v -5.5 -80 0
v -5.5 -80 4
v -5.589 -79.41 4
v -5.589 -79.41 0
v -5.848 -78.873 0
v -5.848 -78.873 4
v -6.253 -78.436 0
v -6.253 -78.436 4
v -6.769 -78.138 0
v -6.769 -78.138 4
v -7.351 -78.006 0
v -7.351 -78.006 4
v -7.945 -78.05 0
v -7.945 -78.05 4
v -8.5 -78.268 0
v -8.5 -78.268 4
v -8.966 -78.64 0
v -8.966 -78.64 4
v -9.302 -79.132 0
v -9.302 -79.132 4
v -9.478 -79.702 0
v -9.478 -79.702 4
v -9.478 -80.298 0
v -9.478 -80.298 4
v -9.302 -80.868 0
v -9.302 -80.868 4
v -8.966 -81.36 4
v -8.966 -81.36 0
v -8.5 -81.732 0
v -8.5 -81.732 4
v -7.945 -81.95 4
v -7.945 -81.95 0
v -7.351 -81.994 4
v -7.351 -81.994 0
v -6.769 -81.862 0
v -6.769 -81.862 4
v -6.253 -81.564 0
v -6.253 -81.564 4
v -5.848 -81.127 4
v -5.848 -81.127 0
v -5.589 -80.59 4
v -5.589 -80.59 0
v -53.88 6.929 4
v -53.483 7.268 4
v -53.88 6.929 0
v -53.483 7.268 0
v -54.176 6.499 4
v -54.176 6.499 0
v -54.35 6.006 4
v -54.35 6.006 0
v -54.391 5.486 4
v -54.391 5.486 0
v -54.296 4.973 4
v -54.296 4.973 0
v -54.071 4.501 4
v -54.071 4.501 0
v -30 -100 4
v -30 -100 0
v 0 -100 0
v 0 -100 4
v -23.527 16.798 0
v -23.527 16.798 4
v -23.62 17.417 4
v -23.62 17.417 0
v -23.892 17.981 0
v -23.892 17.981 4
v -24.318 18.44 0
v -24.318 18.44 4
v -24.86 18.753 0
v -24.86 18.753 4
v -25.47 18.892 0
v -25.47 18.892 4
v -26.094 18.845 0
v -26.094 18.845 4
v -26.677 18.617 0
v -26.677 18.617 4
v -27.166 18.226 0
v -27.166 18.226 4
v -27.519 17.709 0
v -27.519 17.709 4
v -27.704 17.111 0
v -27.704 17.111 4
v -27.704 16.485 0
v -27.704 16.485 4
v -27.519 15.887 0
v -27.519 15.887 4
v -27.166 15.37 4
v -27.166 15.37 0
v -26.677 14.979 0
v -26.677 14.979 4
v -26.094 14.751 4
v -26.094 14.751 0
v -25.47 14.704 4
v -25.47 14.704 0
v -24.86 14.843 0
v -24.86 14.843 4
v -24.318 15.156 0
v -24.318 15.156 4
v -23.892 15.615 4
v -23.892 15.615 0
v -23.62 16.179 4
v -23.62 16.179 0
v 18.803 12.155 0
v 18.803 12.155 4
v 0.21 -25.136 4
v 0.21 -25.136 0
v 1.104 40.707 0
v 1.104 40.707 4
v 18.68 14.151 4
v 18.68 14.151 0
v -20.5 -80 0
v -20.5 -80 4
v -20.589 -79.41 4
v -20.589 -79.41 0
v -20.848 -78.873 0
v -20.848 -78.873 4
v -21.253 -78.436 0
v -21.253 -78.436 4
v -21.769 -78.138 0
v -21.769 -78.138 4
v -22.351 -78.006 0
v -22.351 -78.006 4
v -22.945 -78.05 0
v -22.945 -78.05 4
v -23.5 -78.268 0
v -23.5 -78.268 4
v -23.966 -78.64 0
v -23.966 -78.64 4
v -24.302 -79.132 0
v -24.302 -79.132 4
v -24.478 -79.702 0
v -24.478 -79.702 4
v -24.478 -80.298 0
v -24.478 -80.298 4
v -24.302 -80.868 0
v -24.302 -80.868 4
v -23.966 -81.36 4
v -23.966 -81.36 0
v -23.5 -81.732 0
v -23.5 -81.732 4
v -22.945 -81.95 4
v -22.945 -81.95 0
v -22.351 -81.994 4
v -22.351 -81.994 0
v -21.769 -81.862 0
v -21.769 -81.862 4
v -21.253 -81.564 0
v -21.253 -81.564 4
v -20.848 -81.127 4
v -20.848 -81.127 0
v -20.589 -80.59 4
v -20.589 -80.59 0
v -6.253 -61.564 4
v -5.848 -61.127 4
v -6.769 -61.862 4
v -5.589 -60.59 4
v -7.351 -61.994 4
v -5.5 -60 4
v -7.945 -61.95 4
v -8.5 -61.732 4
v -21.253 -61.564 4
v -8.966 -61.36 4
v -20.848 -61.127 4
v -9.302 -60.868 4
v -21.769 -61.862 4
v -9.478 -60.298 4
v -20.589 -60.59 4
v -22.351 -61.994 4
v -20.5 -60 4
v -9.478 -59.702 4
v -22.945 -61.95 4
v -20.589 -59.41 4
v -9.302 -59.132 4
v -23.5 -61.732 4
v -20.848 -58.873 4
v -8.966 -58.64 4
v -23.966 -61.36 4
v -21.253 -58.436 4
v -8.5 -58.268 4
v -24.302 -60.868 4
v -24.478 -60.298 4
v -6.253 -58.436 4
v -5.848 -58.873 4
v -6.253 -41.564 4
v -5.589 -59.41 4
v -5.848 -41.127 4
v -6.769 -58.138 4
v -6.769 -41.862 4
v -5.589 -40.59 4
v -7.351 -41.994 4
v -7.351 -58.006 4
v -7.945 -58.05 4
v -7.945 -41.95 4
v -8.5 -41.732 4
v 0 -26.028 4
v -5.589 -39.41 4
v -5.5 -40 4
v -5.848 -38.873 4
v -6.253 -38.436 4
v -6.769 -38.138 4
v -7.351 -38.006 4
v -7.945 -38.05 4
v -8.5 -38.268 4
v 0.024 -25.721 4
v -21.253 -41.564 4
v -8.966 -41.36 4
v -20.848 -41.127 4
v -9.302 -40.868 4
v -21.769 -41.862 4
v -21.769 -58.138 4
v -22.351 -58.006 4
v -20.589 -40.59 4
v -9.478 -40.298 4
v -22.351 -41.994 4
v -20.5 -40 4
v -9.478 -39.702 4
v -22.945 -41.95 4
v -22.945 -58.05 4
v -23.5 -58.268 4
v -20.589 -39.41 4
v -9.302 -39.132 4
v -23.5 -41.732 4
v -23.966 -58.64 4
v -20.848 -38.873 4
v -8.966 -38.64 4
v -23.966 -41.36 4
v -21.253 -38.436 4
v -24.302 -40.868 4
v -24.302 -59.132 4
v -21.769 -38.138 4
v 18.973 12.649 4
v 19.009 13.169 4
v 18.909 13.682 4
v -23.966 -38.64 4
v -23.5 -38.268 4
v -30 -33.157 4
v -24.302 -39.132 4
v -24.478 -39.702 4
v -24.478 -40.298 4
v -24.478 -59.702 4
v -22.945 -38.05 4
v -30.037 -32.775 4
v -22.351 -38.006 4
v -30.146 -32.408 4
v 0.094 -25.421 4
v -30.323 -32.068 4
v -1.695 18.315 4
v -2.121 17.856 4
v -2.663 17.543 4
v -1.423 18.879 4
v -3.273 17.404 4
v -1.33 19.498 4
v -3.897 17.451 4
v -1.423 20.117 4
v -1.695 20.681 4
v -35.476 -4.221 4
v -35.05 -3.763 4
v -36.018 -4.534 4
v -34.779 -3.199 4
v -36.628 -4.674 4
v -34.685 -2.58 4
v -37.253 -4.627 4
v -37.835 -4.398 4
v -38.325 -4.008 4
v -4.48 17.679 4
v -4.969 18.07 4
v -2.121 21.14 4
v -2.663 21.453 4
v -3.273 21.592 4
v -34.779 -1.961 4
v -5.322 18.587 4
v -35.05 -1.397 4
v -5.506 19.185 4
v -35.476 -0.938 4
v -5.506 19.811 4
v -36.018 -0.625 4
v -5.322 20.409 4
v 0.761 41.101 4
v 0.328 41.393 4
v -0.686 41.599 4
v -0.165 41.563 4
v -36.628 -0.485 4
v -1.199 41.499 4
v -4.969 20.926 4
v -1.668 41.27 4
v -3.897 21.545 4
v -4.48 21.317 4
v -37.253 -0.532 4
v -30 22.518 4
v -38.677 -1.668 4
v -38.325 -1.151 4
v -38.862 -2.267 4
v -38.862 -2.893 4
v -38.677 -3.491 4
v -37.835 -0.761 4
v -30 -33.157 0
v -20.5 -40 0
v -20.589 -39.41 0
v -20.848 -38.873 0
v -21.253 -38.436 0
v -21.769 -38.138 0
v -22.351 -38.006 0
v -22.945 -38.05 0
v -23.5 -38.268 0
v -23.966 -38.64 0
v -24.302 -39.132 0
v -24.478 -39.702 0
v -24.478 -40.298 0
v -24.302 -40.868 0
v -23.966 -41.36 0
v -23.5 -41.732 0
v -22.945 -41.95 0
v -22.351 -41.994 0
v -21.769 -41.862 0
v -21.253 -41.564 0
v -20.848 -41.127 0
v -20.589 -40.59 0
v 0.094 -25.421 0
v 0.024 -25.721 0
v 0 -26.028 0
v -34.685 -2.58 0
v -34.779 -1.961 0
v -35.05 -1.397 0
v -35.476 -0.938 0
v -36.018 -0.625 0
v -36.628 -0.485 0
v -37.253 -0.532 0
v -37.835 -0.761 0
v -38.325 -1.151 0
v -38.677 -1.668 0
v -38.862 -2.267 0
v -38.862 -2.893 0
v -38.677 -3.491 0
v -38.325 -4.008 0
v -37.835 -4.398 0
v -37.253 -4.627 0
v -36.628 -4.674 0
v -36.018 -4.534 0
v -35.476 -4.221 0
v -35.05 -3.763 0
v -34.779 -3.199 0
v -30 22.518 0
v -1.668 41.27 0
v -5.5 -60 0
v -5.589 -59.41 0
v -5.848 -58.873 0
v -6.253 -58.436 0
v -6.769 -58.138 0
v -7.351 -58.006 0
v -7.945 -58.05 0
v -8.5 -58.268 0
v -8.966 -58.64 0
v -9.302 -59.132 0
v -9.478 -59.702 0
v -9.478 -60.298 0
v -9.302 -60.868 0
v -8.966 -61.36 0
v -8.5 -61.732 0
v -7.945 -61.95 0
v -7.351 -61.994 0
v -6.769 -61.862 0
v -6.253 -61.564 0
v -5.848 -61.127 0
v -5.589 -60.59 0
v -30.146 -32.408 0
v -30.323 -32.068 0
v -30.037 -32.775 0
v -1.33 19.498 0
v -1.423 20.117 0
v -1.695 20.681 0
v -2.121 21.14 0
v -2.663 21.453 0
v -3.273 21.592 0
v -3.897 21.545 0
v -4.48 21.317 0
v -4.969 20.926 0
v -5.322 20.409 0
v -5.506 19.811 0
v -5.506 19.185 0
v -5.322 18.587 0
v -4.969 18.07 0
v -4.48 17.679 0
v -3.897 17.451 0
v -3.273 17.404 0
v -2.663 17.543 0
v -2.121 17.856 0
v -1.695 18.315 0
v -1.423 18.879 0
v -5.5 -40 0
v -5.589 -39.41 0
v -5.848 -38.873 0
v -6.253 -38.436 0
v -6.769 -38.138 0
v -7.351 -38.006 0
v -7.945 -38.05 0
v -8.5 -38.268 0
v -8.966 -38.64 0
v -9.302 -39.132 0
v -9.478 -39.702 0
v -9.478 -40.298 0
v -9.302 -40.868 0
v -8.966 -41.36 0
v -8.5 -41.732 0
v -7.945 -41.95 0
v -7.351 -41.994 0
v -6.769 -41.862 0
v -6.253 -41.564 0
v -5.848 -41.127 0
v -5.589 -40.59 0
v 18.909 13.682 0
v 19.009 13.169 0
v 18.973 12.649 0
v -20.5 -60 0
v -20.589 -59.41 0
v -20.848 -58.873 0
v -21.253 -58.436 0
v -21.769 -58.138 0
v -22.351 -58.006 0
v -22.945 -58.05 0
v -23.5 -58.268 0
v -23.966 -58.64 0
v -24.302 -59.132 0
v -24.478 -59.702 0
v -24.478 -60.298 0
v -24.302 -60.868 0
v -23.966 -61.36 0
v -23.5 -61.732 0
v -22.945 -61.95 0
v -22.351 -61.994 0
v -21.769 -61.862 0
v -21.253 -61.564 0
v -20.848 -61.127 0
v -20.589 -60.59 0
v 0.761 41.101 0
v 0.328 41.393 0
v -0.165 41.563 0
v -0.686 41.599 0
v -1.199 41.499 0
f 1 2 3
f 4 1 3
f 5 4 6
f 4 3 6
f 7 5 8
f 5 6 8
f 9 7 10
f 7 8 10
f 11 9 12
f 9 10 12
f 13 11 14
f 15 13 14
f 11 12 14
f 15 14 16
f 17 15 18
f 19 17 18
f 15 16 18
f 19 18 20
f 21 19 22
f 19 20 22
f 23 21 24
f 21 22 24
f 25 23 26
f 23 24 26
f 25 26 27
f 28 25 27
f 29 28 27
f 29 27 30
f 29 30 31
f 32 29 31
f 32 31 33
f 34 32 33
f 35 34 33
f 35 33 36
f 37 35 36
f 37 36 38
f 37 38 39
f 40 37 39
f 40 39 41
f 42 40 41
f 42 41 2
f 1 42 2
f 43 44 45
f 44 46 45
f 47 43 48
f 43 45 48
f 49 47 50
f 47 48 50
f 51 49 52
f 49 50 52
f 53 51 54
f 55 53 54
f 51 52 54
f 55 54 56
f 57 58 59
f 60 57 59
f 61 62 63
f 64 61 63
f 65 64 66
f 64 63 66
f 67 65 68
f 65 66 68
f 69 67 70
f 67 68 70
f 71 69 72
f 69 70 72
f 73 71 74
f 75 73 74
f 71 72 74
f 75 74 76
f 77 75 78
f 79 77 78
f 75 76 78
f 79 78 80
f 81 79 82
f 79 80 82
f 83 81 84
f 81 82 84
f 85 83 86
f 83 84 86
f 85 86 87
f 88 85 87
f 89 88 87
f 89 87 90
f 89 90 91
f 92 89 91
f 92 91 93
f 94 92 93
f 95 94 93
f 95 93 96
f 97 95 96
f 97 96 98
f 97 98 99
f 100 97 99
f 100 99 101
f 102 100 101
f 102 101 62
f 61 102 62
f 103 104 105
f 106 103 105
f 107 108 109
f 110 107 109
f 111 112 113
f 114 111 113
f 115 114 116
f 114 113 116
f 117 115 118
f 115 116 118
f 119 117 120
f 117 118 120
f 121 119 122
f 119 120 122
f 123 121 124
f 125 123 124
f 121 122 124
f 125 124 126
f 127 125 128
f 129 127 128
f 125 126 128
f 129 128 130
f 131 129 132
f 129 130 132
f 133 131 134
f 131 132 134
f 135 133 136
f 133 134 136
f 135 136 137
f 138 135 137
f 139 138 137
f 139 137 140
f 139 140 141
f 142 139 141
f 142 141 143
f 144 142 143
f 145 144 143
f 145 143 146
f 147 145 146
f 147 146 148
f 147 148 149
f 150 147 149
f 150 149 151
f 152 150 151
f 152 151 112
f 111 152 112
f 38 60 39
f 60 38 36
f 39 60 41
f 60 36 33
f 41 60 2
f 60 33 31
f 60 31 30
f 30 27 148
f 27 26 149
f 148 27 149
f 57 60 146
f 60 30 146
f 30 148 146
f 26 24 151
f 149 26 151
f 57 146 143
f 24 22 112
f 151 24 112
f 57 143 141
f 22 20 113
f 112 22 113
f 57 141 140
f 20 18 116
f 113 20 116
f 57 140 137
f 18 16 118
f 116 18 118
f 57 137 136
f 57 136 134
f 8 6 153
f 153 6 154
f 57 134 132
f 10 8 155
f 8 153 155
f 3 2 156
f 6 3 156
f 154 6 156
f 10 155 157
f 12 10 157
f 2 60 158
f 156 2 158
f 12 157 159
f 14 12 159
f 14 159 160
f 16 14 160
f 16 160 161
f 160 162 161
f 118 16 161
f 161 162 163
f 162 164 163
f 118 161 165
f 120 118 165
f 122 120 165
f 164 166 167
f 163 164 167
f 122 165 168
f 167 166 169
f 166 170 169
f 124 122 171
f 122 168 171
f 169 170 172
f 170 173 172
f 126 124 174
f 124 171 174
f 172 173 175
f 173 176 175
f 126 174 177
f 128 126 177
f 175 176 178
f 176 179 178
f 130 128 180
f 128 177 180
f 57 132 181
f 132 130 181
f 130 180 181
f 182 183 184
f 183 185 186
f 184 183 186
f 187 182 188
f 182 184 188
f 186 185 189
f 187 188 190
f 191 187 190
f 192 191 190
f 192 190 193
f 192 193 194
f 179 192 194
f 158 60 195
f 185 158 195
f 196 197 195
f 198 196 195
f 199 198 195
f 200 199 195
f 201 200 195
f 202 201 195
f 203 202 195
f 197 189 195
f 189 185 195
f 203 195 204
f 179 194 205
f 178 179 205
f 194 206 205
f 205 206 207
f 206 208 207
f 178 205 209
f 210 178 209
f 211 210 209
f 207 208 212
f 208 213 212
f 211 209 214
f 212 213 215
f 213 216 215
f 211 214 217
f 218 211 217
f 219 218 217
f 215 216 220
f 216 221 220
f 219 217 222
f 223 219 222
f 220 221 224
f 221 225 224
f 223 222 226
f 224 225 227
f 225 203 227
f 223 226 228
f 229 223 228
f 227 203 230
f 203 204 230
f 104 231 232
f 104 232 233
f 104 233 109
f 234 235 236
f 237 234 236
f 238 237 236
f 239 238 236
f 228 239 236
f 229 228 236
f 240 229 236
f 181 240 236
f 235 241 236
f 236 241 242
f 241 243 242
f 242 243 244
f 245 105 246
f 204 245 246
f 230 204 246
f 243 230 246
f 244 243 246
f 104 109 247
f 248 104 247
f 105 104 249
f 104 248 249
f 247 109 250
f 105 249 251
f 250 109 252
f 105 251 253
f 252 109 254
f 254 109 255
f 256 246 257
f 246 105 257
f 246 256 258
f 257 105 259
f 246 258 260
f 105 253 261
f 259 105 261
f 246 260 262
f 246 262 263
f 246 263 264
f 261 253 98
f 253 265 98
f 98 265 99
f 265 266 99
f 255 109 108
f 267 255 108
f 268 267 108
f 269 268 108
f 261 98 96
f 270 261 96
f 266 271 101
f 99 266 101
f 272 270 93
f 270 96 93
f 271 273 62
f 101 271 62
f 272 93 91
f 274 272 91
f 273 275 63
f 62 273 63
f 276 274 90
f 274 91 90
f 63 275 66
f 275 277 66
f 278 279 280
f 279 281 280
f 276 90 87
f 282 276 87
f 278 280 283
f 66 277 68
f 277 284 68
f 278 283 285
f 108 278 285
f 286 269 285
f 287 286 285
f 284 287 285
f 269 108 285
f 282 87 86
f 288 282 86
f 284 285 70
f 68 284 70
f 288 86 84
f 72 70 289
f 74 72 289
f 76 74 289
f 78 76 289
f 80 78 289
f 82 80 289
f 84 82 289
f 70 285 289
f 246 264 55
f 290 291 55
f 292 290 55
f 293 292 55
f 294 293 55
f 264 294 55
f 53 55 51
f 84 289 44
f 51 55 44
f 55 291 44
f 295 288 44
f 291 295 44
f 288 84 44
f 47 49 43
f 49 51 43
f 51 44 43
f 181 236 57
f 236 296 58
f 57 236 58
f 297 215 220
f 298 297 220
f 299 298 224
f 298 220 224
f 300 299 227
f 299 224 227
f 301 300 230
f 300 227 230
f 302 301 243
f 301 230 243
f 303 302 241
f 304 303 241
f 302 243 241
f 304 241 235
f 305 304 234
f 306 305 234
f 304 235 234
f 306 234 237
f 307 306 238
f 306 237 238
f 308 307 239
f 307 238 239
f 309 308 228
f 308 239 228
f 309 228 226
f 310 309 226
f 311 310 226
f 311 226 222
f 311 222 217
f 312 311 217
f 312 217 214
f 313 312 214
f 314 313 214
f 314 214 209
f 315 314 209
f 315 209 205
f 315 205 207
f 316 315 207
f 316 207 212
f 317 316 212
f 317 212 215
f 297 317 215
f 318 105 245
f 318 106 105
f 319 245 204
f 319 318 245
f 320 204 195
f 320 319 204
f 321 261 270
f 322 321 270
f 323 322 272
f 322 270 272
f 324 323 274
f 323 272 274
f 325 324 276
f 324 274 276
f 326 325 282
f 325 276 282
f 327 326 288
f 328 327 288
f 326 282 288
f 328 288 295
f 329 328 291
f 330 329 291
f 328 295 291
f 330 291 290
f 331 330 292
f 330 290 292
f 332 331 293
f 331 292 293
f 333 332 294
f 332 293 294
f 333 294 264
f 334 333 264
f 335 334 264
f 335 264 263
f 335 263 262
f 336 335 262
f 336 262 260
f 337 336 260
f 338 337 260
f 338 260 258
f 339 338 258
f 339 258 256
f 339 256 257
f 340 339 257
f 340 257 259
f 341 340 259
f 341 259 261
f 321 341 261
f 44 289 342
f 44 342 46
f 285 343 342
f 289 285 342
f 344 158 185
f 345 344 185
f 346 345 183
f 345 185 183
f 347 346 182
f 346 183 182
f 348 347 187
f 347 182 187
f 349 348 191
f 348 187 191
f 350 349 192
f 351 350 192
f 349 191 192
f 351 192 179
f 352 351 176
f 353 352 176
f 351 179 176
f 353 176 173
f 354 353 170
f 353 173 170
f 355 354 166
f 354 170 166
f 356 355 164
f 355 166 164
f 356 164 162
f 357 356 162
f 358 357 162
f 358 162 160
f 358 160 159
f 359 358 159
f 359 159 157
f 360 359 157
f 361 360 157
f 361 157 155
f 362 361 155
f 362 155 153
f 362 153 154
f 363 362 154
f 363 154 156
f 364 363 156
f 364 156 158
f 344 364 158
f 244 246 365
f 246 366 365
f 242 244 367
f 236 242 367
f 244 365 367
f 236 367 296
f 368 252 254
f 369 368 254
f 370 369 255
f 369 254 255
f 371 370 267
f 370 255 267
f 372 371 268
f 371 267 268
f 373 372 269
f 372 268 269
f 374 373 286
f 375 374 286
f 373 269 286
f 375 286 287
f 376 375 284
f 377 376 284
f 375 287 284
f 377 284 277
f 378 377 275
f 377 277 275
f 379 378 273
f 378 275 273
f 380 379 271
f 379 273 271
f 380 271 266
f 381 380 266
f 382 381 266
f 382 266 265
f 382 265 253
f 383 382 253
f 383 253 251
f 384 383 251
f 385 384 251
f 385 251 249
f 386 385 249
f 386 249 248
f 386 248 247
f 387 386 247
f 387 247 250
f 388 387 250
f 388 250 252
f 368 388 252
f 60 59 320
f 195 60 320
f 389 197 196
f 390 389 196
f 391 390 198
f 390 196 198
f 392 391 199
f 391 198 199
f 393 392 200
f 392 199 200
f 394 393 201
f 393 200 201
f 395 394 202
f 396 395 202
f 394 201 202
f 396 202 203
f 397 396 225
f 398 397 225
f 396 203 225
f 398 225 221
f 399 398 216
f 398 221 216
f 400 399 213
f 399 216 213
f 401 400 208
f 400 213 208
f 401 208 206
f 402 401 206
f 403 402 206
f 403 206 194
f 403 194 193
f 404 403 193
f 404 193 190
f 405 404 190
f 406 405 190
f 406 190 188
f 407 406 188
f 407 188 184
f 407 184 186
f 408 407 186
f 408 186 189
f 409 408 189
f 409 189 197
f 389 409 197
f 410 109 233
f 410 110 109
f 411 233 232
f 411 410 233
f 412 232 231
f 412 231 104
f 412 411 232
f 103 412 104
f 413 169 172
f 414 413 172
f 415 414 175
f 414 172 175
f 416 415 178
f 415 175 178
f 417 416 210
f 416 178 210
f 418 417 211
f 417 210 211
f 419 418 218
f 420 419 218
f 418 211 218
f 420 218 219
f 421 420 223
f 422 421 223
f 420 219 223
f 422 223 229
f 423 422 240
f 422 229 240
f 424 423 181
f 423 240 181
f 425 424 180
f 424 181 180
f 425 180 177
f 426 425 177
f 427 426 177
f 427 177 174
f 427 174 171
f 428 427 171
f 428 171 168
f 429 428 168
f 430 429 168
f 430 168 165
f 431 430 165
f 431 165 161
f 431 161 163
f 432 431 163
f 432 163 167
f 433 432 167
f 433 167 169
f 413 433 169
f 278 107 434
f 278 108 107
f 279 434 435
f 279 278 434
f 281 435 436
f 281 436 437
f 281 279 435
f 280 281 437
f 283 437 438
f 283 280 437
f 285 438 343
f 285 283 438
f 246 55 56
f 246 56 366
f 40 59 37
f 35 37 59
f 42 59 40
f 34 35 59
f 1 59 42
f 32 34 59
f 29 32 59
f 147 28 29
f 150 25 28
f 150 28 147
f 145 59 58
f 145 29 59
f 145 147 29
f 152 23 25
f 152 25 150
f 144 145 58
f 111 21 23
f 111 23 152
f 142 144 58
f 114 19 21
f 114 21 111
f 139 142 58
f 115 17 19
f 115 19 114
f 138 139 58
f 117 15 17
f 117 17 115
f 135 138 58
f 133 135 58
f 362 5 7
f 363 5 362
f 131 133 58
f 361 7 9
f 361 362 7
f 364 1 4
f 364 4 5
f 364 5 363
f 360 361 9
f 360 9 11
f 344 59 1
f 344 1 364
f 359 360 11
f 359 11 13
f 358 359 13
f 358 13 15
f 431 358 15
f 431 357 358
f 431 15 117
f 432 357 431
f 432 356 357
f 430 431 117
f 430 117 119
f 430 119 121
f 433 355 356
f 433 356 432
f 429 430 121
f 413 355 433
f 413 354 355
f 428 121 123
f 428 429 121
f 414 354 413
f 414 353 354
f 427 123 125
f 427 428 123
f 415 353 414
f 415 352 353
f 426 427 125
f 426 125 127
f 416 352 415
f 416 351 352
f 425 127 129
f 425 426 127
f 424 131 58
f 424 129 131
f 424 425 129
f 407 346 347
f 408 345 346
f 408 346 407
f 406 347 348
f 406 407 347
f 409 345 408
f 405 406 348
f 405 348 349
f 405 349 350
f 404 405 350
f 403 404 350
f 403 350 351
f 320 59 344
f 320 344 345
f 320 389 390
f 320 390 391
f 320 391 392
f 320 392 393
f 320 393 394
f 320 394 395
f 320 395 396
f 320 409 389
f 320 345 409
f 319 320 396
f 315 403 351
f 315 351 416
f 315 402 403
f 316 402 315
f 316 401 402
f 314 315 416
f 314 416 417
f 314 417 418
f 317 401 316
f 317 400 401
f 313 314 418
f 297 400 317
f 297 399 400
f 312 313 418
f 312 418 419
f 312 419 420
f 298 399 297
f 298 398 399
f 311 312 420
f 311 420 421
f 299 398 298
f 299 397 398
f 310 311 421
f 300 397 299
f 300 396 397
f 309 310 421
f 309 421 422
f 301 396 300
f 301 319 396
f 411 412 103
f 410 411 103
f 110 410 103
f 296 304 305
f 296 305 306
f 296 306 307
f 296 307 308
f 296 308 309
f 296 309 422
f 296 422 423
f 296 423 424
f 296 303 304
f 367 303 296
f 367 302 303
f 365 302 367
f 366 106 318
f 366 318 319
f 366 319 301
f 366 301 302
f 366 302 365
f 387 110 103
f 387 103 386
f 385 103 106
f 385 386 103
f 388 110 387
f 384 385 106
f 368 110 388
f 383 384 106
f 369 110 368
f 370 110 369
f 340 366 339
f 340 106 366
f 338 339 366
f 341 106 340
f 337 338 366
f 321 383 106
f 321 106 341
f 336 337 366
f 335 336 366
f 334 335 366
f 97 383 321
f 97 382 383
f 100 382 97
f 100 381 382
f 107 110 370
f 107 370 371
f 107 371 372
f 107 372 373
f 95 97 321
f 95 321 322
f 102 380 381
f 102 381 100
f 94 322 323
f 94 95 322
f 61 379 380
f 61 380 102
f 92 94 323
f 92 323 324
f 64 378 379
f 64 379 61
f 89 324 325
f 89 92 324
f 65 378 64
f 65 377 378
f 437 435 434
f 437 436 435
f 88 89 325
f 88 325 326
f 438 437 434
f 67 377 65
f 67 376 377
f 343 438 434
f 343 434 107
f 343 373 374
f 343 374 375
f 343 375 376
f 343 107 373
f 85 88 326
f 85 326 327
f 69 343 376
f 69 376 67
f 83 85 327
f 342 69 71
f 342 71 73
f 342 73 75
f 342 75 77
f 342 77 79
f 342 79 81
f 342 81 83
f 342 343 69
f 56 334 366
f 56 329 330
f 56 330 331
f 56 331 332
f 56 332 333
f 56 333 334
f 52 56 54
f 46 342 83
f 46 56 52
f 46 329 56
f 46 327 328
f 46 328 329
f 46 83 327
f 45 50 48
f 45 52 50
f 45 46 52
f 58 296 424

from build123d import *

# Parameters (mm, degrees)
EXTRUDE_1_DEPTH     = 4
CUT_EXTRUDE_1_REACH = 106.48
SKETCH_14_R         = 2
EXTRUDE_2_DEPTH     = 4
SKETCH_17_R         = 2.1
CUT_EXTRUDE_2_DEPTH = 10
EXTRUDE_3_DEPTH     = 4
FILLET_1_R          = 2


with BuildPart() as part:
    # 草图13 → 凸台-拉伸1 (new body)
    with BuildSketch(Plane.XY):
        Polygon((-30, -100), (0, -100), (0, 0), (0, 42.37433904), (-30, 22.517772204), align=None)
    extrude(amount=EXTRUDE_1_DEPTH)

    # 草图14 → 切除-拉伸1 (cut, up to next)
    with BuildSketch(Plane.XY.offset(4), mode=Mode.PRIVATE) as cut_extrude_1_sk1:
        with Locations((-22.5, -40)):
            Circle(SKETCH_14_R)
    cut_extrude_1_tool1 = extrude(cut_extrude_1_sk1.sketch, amount=-CUT_EXTRUDE_1_REACH, mode=Mode.PRIVATE) & part.part
    # 草图14 → 切除-拉伸1 (cut, up to next)
    with BuildSketch(Plane.XY.offset(4), mode=Mode.PRIVATE) as cut_extrude_1_sk2:
        with Locations((-7.5, -40)):
            Circle(SKETCH_14_R)
    cut_extrude_1_tool2 = extrude(cut_extrude_1_sk2.sketch, amount=-CUT_EXTRUDE_1_REACH, mode=Mode.PRIVATE) & part.part
    # 草图14 → 切除-拉伸1 (cut, up to next)
    with BuildSketch(Plane.XY.offset(4), mode=Mode.PRIVATE) as cut_extrude_1_sk3:
        with Locations((-7.5, -60)):
            Circle(SKETCH_14_R)
    cut_extrude_1_tool3 = extrude(cut_extrude_1_sk3.sketch, amount=-CUT_EXTRUDE_1_REACH, mode=Mode.PRIVATE) & part.part
    # 草图14 → 切除-拉伸1 (cut, up to next)
    with BuildSketch(Plane.XY.offset(4), mode=Mode.PRIVATE) as cut_extrude_1_sk4:
        with Locations((-7.5, -80)):
            Circle(SKETCH_14_R)
    cut_extrude_1_tool4 = extrude(cut_extrude_1_sk4.sketch, amount=-CUT_EXTRUDE_1_REACH, mode=Mode.PRIVATE) & part.part
    # 草图14 → 切除-拉伸1 (cut, up to next)
    with BuildSketch(Plane.XY.offset(4), mode=Mode.PRIVATE) as cut_extrude_1_sk5:
        with Locations((-22.5, -60)):
            Circle(SKETCH_14_R)
    cut_extrude_1_tool5 = extrude(cut_extrude_1_sk5.sketch, amount=-CUT_EXTRUDE_1_REACH, mode=Mode.PRIVATE) & part.part
    # 草图14 → 切除-拉伸1 (cut, up to next)
    with BuildSketch(Plane.XY.offset(4), mode=Mode.PRIVATE) as cut_extrude_1_sk6:
        with Locations((-22.5, -80)):
            Circle(SKETCH_14_R)
    cut_extrude_1_tool6 = extrude(cut_extrude_1_sk6.sketch, amount=-CUT_EXTRUDE_1_REACH, mode=Mode.PRIVATE) & part.part
    add(cut_extrude_1_tool1.solids().sort_by_distance((-22.5, -40, 4))[0], mode=Mode.SUBTRACT)
    add(cut_extrude_1_tool2.solids().sort_by_distance((-7.5, -40, 4))[0], mode=Mode.SUBTRACT)
    add(cut_extrude_1_tool3.solids().sort_by_distance((-7.5, -60, 4))[0], mode=Mode.SUBTRACT)
    add(cut_extrude_1_tool4.solids().sort_by_distance((-7.5, -80, 4))[0], mode=Mode.SUBTRACT)
    add(cut_extrude_1_tool5.solids().sort_by_distance((-22.5, -60, 4))[0], mode=Mode.SUBTRACT)
    add(cut_extrude_1_tool6.solids().sort_by_distance((-22.5, -80, 4))[0], mode=Mode.SUBTRACT)

    # 草图16 → 凸台-拉伸2 (add)
    with BuildSketch(Plane.XY.offset(4)):
        Polygon((-30, 22.517772204), (-55.160117038, 6.178601154), (-30, -32.564581559), align=None)
    extrude(amount=-EXTRUDE_2_DEPTH)

    # 草图17 → 切除-拉伸2 (cut)
    with BuildSketch(Plane.XY.offset(4)):
        with Locations((-3.429938262, 19.497880137)):
            Circle(SKETCH_17_R)
        with Locations((-25.627024556, 16.797998652)):
            Circle(SKETCH_17_R)
        with Locations((-36.785371145, -2.579599275)):
            Circle(SKETCH_17_R)
    extrude(amount=-CUT_EXTRUDE_2_DEPTH, mode=Mode.SUBTRACT)

    # 草图18 → 凸台-拉伸3 (add)
    with BuildSketch(Plane.XY.offset(4)):
        Polygon((0, 42.37433904), (19.317794486, 13.188335268), (0, -25.557166319), align=None)
    extrude(amount=-EXTRUDE_3_DEPTH)

    # 圆角1
    fillet_1_edges = [part.edges().sort_by_distance(p)[0] for p in [
        (-30, -32.564581559, 2),
        (-55.160117038, 6.178601154, 2),
        (0, -25.557166319, 2),
        (19.317794486, 13.188335268, 2),
        (0, 42.37433904, 2),
    ]]
    fillet(fillet_1_edges, radius=FILLET_1_R)


solid = part.part
